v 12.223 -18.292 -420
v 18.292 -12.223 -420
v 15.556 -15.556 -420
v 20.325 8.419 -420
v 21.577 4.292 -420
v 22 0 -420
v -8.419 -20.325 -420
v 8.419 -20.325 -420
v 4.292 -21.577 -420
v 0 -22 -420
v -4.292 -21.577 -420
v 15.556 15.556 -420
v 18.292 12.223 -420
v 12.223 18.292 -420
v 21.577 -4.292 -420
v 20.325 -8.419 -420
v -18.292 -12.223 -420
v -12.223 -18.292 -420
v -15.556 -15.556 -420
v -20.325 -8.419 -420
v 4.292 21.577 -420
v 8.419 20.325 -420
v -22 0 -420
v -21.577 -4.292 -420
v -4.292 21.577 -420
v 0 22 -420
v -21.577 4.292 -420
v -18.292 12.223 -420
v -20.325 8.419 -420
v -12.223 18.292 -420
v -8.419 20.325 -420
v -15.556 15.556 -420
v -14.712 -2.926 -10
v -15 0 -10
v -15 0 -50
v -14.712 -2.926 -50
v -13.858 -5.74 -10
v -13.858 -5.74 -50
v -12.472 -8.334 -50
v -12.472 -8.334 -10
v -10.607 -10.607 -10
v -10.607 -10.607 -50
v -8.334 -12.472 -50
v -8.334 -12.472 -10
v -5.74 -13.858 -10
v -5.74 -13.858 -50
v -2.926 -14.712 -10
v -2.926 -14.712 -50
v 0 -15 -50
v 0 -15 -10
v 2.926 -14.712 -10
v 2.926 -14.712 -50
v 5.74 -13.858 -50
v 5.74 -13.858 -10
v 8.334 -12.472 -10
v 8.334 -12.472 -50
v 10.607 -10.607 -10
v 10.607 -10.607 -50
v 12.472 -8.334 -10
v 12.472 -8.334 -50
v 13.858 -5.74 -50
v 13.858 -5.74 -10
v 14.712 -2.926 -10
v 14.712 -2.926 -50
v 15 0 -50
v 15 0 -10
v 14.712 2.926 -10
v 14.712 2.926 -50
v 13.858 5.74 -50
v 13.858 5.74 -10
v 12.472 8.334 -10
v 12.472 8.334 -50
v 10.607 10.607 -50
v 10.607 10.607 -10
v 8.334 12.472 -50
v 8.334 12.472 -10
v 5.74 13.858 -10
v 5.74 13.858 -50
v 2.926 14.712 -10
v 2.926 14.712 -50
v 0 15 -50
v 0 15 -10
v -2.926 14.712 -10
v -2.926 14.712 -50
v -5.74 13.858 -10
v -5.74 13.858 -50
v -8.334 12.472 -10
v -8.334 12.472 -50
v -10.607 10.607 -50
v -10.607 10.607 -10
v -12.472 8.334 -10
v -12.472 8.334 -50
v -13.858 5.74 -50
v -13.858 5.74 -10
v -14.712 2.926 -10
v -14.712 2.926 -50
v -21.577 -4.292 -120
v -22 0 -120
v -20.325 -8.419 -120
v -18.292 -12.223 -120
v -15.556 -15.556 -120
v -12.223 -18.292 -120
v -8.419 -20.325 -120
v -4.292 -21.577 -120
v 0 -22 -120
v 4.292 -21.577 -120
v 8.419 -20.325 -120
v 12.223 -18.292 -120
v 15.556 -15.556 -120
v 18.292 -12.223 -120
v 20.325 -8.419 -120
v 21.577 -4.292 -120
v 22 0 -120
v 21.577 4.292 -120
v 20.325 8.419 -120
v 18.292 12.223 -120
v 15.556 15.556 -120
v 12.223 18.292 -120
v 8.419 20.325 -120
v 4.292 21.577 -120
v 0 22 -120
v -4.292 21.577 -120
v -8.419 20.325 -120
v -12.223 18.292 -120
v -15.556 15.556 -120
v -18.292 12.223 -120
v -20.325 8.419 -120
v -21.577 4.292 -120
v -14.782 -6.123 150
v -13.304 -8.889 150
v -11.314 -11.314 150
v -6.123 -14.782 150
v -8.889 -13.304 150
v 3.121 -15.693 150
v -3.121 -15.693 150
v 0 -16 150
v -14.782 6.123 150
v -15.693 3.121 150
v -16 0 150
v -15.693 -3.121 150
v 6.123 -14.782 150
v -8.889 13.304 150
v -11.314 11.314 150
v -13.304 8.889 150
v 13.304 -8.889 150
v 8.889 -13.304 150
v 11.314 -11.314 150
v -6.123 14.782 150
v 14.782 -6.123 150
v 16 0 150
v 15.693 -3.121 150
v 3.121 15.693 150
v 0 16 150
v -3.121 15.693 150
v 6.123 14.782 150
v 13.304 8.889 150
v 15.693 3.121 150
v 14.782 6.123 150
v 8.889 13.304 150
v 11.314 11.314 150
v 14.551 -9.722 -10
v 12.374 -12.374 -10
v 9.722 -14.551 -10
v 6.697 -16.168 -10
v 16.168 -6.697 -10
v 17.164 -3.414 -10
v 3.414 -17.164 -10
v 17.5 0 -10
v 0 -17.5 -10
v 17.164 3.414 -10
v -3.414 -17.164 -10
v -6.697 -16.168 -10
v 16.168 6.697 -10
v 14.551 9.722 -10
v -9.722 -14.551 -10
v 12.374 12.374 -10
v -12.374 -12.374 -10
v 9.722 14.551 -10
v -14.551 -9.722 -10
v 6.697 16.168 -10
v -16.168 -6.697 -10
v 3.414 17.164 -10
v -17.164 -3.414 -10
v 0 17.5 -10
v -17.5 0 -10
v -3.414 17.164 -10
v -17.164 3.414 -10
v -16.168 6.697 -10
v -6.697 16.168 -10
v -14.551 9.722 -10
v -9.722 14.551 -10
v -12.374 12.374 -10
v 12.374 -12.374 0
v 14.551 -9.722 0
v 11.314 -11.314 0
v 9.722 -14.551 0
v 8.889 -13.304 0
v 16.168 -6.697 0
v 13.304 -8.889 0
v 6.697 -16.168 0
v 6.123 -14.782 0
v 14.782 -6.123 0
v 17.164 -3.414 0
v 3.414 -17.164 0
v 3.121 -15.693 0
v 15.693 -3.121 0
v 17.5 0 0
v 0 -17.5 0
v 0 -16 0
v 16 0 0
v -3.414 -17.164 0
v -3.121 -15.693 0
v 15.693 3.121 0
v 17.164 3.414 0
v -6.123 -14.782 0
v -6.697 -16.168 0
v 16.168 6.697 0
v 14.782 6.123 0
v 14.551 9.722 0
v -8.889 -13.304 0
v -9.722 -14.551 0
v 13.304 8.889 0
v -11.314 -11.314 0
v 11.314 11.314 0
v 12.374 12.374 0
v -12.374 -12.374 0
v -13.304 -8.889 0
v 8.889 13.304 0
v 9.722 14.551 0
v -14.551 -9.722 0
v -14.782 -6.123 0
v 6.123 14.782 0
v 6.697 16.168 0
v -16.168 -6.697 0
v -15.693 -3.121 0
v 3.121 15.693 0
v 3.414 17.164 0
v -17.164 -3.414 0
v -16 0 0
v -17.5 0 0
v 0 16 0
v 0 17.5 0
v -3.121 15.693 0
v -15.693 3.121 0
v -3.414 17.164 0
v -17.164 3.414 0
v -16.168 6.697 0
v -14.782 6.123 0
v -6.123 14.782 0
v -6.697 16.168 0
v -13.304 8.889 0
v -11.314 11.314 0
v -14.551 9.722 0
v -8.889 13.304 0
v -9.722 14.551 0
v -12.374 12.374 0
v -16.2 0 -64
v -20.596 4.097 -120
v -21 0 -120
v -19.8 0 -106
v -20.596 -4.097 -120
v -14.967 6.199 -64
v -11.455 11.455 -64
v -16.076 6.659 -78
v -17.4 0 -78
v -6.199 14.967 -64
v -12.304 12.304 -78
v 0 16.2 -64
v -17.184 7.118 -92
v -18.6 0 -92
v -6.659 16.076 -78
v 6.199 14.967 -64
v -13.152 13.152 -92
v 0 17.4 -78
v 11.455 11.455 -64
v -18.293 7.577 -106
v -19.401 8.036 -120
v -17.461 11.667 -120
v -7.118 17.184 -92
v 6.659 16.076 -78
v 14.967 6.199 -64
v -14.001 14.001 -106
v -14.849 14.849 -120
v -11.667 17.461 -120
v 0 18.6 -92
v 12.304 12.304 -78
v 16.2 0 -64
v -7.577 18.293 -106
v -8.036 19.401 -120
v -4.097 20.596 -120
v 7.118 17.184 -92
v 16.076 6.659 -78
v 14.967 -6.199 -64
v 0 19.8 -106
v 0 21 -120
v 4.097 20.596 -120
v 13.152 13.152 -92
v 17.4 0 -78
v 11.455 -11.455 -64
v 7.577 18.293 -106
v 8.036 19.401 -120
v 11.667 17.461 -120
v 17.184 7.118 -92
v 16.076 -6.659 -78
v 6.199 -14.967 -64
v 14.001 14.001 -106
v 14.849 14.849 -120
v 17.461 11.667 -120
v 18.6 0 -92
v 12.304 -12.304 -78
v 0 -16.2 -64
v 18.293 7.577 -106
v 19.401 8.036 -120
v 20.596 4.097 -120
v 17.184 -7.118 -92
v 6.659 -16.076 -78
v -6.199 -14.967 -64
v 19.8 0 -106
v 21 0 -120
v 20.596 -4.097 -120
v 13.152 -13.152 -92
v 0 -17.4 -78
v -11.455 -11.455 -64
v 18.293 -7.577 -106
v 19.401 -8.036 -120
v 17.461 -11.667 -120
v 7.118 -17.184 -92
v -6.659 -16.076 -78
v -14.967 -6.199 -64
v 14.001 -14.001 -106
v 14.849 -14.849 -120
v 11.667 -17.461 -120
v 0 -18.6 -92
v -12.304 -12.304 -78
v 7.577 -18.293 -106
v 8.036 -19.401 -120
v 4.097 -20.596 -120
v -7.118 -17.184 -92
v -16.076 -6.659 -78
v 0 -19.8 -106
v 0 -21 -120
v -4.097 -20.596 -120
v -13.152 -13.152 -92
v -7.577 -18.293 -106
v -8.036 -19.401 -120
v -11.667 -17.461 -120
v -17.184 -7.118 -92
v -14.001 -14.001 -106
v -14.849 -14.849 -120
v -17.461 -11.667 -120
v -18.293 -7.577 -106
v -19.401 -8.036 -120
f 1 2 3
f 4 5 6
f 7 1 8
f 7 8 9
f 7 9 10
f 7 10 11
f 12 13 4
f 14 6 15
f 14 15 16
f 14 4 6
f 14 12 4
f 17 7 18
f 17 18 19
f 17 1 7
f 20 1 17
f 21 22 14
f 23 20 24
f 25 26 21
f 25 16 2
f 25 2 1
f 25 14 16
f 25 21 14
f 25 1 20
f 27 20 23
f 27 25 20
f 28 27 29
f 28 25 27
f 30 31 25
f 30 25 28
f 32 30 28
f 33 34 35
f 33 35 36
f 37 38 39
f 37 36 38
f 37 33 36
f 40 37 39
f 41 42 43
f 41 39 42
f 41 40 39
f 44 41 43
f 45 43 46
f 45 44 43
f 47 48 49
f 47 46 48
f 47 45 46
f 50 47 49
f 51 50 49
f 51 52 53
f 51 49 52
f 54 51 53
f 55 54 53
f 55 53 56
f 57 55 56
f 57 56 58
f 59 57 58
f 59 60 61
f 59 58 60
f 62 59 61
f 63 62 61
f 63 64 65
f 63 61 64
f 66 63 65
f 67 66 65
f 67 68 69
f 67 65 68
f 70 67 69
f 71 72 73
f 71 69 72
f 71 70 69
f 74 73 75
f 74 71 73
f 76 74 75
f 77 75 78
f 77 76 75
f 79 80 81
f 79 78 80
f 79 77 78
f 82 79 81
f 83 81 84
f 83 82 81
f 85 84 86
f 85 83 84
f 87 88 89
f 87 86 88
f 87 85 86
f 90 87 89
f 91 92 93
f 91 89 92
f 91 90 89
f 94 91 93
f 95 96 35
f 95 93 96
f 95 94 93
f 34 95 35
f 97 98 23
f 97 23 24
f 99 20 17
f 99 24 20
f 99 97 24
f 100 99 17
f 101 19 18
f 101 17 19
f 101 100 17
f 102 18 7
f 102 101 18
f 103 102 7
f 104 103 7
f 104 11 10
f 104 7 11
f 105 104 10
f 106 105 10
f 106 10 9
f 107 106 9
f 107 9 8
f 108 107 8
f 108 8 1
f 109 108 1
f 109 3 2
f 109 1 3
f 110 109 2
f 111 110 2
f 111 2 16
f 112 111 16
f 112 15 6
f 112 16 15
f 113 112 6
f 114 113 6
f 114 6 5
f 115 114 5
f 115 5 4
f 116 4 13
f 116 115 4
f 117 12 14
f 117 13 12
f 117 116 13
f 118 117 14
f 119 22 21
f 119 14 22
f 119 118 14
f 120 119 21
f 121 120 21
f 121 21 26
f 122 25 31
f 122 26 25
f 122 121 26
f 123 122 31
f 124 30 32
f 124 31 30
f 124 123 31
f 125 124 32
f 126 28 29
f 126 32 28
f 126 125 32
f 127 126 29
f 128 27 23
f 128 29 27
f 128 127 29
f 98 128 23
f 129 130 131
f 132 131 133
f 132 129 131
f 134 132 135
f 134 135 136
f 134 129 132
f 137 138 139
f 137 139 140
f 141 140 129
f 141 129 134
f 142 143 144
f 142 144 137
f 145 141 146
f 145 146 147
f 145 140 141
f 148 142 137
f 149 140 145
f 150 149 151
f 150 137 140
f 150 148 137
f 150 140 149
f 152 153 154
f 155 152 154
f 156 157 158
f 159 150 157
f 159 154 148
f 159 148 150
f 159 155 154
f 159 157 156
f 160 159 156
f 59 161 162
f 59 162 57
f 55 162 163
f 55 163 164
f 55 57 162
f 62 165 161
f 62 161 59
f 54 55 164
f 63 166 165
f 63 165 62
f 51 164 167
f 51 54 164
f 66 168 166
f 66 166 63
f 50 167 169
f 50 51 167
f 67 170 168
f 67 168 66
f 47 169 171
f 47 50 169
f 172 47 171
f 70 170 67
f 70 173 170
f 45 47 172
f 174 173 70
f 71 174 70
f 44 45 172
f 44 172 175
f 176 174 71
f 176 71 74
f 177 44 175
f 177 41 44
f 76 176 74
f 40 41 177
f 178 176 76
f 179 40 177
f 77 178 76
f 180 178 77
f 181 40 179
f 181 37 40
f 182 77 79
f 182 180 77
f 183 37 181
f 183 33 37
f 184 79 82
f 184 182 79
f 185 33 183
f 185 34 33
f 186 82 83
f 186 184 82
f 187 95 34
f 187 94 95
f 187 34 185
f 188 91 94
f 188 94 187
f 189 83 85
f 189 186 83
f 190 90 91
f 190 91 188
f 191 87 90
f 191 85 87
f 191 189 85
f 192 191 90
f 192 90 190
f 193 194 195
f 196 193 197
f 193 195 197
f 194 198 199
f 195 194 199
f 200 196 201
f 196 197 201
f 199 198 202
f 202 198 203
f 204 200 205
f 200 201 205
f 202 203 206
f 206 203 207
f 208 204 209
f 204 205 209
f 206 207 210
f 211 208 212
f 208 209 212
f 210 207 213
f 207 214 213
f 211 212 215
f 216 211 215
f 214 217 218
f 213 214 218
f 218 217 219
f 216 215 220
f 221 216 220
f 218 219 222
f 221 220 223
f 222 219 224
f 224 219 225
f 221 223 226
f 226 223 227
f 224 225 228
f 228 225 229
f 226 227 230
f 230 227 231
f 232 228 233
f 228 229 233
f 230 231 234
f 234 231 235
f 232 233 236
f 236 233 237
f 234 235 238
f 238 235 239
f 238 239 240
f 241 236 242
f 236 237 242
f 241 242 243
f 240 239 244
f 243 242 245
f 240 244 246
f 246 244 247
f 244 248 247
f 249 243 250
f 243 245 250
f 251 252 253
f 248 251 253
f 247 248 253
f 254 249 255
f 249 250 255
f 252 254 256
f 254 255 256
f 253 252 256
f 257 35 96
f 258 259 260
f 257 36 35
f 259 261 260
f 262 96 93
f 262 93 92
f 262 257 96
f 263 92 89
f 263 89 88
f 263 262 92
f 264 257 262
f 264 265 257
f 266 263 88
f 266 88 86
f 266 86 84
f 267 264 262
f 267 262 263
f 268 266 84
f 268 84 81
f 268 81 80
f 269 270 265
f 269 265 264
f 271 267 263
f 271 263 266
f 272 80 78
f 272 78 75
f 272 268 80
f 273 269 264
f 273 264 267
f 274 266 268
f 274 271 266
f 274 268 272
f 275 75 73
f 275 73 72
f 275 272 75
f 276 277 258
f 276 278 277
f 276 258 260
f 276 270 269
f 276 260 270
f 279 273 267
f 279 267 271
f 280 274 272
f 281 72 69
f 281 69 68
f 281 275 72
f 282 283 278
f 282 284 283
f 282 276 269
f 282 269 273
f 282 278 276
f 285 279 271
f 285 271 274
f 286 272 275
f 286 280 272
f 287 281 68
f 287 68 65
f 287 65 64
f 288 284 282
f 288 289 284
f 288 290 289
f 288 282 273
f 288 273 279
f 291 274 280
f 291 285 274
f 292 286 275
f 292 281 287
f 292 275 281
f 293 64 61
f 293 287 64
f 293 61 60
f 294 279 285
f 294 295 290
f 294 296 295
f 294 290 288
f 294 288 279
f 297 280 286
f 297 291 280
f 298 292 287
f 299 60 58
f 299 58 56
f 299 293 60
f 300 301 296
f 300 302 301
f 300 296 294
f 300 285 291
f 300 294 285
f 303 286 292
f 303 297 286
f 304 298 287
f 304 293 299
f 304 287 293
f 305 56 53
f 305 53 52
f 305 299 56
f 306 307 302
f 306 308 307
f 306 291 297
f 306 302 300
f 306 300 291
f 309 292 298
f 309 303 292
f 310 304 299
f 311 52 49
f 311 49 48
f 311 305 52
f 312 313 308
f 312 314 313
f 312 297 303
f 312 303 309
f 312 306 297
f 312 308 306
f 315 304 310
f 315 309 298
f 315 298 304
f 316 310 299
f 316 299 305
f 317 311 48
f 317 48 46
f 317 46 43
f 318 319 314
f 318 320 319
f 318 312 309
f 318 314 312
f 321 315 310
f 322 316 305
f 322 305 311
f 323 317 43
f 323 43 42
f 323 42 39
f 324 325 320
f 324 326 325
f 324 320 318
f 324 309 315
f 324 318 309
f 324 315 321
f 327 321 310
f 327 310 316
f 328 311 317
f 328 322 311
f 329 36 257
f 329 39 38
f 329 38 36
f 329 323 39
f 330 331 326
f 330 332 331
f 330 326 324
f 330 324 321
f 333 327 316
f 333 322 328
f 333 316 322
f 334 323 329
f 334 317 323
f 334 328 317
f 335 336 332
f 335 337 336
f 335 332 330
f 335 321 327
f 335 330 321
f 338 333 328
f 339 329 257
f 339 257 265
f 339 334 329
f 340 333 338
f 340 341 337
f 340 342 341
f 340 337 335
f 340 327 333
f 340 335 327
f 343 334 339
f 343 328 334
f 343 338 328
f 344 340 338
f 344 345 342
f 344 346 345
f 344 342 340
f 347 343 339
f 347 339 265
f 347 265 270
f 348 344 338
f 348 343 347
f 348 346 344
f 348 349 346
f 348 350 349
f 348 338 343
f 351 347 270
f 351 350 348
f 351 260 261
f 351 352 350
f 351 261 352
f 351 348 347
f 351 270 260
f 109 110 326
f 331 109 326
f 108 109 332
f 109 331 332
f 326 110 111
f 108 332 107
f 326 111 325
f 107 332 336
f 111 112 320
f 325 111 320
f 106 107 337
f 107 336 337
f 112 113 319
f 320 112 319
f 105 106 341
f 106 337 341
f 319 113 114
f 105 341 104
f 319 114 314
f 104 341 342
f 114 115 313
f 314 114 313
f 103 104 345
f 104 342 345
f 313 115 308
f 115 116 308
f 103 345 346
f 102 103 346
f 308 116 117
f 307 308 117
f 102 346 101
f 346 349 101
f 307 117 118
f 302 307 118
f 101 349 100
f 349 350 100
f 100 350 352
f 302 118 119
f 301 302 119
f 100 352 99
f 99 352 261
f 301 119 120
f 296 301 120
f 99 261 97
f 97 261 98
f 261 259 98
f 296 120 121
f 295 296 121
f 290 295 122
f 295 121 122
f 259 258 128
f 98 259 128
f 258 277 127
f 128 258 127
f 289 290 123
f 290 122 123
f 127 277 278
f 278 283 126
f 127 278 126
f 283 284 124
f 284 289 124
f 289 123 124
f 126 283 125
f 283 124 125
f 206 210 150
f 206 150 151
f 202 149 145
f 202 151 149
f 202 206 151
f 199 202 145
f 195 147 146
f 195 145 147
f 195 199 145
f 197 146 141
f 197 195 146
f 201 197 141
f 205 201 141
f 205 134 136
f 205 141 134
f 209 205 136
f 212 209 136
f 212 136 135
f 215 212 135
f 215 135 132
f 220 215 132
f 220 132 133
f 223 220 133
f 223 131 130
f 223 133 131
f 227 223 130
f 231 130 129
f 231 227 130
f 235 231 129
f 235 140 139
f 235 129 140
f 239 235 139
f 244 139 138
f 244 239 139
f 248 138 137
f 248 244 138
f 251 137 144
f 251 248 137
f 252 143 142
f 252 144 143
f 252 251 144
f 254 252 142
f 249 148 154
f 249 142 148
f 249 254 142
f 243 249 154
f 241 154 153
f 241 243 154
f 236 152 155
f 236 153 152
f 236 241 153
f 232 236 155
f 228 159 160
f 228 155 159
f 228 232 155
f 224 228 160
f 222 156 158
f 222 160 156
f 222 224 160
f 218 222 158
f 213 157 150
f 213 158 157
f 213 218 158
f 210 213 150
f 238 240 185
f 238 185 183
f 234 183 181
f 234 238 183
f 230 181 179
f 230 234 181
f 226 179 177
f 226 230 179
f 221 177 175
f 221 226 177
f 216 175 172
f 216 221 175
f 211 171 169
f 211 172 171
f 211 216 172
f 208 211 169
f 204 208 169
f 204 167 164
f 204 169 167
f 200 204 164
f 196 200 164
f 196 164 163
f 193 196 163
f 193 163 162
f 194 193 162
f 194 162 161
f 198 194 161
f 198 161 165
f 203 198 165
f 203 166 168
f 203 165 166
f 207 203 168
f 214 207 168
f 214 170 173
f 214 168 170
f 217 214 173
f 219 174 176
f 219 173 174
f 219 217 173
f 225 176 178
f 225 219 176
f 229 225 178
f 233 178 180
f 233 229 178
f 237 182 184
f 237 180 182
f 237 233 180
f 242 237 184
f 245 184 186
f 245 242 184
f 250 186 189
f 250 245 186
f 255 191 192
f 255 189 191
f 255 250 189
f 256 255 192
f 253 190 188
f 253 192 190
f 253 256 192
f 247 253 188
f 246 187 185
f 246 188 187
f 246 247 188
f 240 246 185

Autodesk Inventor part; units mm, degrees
ref_plane "YZ Plane" through (0, 0, 0) normal (1, 0, 0) x (0, 1, 0)
ref_plane "XZ Plane" through (0, 0, 0) normal (0, 1, 0) x (-1, 0, 0)
sketch "Sketch1" plane through (0, 0, 0) normal (0, 0, 1) x (1, 0, 0)
  circle A0 centre (0, 0) radius 16
  dimension "d0" = 32
extrude "Extrusion1" add sketch "Sketch1" along normal blind 150
sketch "Sketch2" plane through (0, 0, 0) normal (0, 0, -1) x (-1, 0, 0)
  circle A0 centre (0, 0) radius 17.5
  dimension "d3" = 35
extrude "Extrusion2" add sketch "Sketch2" along normal blind 10
sketch "Sketch3" plane through (0, 0, -10) normal (0, 0, -1) x (-1, 0, 0)
  circle A0 centre (0, 0) radius 15
  dimension "d6" = 30
extrude "Extrusion3" add sketch "Sketch3" along normal blind 40
sketch "Sketch4" plane through (0, 0, -50) normal (0, 0, -1) x (-1, 0, 0)
  circle A0 centre (0, 0) radius 15
  dimension "d10" = 30
ref_plane "Work Plane1" through (0, 0, -120) normal (0, 0, -1) x (-1, 0, 0)
sketch "Sketch5" plane through (0, 0, -120) normal (0, 0, -1) x (-1, 0, 0)
  circle A0 centre (0, 0) radius 16 projected
  circle A1 centre (0, 0) radius 21
  dimension "d11" = 42
loft "Loft1" add profiles "Sketch5" section 1 edges at (15, 0, -50) contours A0 | A1
sketch "Sketch6" plane through (0, 0, -120) normal (0, 0, -1) x (-1, 0, 0)
  circle A0 centre (0, 0) radius 22
  dimension "d16" = 44
extrude "Extrusion4" add sketch "Sketch6" along normal blind 300
properties part number "oar"
